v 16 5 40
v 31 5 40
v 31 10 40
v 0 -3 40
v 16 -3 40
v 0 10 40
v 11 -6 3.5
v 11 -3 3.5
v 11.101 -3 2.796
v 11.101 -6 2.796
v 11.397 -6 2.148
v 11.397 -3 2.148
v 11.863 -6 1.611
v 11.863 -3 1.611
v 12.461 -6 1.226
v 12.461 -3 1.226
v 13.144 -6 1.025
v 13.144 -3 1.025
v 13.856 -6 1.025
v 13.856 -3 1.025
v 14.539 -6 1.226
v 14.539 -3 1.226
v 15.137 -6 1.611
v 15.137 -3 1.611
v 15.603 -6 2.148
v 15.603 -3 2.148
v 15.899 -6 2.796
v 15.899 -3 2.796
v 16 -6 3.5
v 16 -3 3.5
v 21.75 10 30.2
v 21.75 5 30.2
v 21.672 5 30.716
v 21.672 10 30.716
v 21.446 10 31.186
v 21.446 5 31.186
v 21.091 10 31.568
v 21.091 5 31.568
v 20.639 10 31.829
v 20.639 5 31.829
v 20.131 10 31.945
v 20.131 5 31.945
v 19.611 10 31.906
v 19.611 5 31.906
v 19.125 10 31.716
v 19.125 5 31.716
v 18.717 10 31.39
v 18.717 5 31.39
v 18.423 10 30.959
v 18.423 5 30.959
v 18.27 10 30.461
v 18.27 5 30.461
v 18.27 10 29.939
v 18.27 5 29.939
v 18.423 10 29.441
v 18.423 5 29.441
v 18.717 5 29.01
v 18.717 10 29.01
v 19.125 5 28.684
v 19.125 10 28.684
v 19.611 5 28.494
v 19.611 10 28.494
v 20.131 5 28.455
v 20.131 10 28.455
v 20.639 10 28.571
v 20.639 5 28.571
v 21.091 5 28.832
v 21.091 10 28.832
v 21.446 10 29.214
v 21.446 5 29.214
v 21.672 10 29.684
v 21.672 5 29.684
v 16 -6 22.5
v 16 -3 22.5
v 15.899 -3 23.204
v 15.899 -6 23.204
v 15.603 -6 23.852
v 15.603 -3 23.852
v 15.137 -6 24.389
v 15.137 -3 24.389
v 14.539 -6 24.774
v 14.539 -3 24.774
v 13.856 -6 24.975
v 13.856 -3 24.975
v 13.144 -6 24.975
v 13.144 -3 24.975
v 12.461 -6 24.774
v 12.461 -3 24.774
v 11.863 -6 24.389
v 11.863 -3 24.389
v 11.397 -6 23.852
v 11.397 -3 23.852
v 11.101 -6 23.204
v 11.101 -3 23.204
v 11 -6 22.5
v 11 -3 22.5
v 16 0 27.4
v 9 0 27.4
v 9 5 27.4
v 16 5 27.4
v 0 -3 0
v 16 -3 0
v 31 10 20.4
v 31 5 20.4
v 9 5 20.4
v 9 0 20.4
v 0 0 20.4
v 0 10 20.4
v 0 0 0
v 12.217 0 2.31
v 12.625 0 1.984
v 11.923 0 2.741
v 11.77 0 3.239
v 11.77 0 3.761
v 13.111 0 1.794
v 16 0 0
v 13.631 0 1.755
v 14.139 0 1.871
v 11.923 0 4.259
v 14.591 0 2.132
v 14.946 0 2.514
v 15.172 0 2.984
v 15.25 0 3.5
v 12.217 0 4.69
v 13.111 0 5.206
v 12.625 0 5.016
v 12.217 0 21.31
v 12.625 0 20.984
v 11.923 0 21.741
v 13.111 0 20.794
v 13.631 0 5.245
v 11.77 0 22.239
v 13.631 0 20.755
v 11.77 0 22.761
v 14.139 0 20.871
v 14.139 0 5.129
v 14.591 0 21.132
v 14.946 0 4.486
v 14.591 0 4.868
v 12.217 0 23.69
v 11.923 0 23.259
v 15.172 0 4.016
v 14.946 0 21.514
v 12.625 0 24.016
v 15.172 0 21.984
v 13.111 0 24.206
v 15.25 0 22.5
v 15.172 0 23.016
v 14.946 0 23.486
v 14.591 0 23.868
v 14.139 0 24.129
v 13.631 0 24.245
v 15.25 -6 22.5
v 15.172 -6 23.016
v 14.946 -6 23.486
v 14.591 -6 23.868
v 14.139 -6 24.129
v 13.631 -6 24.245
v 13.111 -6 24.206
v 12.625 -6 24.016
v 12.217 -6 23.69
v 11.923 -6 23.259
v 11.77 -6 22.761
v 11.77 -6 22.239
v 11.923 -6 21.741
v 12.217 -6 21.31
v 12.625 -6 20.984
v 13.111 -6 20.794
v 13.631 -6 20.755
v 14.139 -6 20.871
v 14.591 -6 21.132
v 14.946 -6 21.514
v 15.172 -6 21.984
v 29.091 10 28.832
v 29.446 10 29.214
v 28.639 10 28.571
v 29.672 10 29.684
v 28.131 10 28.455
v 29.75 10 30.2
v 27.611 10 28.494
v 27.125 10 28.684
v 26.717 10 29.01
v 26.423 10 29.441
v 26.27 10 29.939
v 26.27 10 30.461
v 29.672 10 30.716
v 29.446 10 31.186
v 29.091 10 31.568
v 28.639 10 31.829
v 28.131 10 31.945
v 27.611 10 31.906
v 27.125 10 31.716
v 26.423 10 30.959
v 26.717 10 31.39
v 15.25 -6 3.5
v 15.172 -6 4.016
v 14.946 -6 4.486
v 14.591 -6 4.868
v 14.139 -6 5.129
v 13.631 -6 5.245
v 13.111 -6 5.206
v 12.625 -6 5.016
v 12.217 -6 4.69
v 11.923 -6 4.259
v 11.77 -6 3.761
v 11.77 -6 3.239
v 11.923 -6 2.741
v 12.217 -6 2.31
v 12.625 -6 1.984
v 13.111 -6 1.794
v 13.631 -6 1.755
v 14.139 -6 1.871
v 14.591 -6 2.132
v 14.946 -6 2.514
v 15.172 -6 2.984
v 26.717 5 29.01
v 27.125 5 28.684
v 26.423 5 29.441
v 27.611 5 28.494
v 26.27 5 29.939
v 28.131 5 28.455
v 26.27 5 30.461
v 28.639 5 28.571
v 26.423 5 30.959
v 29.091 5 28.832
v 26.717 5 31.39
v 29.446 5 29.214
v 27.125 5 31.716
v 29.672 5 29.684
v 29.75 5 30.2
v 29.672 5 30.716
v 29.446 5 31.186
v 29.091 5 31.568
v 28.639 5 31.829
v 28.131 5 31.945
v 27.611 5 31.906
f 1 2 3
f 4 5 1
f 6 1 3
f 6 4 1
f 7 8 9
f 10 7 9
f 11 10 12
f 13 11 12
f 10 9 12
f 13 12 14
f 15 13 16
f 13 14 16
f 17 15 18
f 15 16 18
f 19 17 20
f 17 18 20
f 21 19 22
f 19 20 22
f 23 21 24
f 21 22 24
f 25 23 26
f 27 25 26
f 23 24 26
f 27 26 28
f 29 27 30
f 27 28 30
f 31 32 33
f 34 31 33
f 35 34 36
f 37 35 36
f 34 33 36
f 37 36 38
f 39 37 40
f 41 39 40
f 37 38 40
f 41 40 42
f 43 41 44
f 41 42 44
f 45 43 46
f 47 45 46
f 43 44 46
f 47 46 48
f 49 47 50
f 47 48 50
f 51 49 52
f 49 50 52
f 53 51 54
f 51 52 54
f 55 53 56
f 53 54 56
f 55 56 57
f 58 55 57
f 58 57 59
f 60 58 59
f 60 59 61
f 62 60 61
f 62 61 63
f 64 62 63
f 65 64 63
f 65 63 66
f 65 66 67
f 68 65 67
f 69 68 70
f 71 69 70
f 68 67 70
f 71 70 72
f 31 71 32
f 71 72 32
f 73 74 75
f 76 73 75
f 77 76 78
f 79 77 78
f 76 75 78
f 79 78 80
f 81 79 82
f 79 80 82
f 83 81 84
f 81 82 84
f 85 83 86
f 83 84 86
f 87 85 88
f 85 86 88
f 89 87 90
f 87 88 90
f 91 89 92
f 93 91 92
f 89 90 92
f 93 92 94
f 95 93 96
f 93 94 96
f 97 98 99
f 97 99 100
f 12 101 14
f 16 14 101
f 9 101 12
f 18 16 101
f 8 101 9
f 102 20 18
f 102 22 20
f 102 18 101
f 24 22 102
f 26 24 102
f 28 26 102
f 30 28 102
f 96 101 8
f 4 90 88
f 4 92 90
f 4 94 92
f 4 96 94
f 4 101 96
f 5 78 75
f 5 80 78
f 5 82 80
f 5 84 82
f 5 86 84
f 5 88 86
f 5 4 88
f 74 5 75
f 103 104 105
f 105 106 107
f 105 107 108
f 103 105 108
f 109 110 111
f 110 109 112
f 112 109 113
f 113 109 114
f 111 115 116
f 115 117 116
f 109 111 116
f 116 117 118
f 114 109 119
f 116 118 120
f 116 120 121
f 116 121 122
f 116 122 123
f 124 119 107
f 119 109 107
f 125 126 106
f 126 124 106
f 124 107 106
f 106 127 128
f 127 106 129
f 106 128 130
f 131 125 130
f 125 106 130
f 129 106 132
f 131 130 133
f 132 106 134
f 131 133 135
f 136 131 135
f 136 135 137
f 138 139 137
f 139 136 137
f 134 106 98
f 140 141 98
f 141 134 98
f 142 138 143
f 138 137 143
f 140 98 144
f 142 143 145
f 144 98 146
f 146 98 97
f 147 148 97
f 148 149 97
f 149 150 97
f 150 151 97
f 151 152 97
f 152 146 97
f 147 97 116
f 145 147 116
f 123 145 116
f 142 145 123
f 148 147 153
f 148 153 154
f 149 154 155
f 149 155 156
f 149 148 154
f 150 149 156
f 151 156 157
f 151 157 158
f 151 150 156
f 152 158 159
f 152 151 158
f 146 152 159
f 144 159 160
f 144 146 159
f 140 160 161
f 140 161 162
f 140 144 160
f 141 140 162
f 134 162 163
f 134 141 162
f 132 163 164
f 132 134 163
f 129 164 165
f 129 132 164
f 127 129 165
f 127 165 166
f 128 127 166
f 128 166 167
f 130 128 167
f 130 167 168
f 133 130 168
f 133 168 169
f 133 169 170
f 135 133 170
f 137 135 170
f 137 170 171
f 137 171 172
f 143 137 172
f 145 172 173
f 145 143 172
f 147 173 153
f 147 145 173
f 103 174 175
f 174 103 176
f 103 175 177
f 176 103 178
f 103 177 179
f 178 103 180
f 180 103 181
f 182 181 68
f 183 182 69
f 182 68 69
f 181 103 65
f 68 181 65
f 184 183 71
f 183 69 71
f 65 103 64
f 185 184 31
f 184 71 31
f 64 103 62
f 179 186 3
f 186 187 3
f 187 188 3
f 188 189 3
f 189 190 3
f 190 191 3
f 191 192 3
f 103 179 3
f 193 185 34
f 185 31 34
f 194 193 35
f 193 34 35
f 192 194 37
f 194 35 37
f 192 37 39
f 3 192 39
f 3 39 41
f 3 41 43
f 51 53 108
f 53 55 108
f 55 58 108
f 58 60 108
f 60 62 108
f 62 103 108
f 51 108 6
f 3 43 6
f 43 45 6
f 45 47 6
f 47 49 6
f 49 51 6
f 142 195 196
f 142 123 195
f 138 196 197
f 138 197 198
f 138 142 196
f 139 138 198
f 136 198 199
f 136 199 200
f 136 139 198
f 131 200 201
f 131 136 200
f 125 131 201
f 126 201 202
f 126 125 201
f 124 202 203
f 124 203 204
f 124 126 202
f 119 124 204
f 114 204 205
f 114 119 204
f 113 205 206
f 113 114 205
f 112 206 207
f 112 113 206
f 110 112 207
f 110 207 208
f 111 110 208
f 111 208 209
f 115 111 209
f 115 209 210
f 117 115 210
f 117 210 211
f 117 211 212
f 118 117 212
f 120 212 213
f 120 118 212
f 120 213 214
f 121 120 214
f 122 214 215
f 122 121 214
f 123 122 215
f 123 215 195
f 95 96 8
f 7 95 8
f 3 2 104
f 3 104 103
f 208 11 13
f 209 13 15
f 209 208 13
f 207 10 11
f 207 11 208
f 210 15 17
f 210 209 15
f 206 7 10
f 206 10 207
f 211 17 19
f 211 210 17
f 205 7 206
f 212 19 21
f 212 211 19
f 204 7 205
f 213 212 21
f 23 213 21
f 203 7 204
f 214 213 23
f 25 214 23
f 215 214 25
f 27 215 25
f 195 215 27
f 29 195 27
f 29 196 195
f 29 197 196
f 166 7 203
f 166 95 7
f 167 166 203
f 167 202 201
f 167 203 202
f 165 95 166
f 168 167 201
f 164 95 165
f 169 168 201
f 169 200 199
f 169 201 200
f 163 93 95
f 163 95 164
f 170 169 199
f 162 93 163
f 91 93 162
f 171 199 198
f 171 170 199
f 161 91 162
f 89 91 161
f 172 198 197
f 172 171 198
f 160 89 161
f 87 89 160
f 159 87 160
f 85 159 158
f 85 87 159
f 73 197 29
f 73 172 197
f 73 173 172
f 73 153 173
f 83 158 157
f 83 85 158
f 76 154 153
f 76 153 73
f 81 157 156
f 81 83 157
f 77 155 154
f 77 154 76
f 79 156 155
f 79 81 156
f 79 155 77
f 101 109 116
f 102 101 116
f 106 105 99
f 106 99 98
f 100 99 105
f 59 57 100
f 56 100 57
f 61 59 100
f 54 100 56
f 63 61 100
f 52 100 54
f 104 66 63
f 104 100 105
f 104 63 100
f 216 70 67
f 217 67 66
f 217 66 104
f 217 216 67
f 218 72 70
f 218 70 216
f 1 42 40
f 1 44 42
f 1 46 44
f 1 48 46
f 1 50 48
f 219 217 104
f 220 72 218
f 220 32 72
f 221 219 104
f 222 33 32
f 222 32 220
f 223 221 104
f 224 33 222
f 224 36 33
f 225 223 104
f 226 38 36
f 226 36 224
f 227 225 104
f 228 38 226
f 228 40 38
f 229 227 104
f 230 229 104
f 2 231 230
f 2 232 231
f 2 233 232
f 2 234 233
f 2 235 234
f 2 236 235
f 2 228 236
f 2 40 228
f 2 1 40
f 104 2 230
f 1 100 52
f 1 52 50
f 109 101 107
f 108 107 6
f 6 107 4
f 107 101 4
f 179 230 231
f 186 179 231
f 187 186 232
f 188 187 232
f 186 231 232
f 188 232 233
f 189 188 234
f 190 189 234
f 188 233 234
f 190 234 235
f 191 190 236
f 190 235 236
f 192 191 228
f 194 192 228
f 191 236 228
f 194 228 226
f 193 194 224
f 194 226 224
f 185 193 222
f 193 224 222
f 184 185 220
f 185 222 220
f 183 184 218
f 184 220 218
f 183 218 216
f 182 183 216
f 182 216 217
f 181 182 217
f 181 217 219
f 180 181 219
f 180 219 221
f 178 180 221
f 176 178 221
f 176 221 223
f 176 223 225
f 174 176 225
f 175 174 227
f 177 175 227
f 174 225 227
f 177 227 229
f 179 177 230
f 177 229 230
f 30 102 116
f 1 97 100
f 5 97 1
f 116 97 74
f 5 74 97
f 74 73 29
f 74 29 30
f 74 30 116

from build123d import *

# Parameters (mm, degrees)
F0_W      = 16
F0_H      = 40
F0_R      = 1.75
F1_DEPTH  = 3
F2_R      = 1.75
F3_DEPTH  = 3
F4_W      = 16
F4_H      = 19.6
F4_R      = 1.75
F5_DEPTH  = 10
F6_W      = 5
F6_H      = 19.6
F7_DEPTH  = 15
F8_R      = 1.75
F9_DEPTH  = 5
F10_W     = 7
F10_H     = 5
F11_DEPTH = 7
F12_R     = 1.75
F13_DEPTH = 5


with BuildPart() as f1:
    # F0 (on Front) → F1 (new body)
    with BuildSketch(Plane.XZ):
        with Locations((8, 20)):
            Rectangle(F0_W, F0_H)
        with Locations((13.5, 3.5)):
            Circle(F0_R, mode=Mode.SUBTRACT)
        with Locations((13.5, 22.5)):
            Circle(F0_R, mode=Mode.SUBTRACT)
    extrude(amount=F1_DEPTH)

    # F2 (on face) → F3 (join)
    with BuildSketch(Plane.XZ.offset(3)):
        with BuildLine():
            ThreePointArc((11, 3.5), (13.5, 1), (16, 3.5))
            Line((16, 3.5), (16, 22.5))
            ThreePointArc((16, 22.5), (13.5, 25), (11, 22.5))
            Line((11, 22.5), (11, 3.5))
        make_face()
        with Locations((13.5, 3.5)):
            Circle(F2_R, mode=Mode.SUBTRACT)
        with Locations((13.5, 22.5)):
            Circle(F2_R, mode=Mode.SUBTRACT)
    extrude(amount=F3_DEPTH)

    # F4 (on face) → F5 (join)
    with BuildSketch(Plane(origin=(0, 0, 0), x_dir=(-1, 0, 0), z_dir=(0, 1, 0))):
        with Locations((-8, 30.2)):
            Rectangle(F4_W, F4_H)
        with Locations((-13.5, 22.5)):
            Circle(F4_R, mode=Mode.SUBTRACT)
    extrude(amount=F5_DEPTH)

    # F6 (on face) → F7 (join)
    with BuildSketch(Plane.YZ.offset(16)):
        with Locations((7.5, 30.2)):
            Rectangle(F6_W, F6_H)
    extrude(amount=F7_DEPTH)

    # F8 (on face) → F9 (cut, through all)
    with BuildSketch(Plane.XZ.offset(-5)):
        with Locations((20, 30.2)):
            Circle(F8_R)
        with Locations((28, 30.2)):
            Circle(F8_R)
    extrude(amount=-F9_DEPTH, mode=Mode.SUBTRACT)

    # F10 (on face) → F11 (cut)
    with BuildSketch(Plane(origin=(0, 0, 20.4), x_dir=(1, 0, 0), z_dir=(0, 0, -1))):
        with Locations((12.5, -2.5)):
            Rectangle(F10_W, F10_H)
    extrude(amount=-F11_DEPTH, mode=Mode.SUBTRACT)

    # F12 (on face) → F13 (join, through all)
    with BuildSketch(Plane.XZ.offset(-5)):
        with Locations((13.5, 22.5)):
            Circle(F12_R)
    extrude(amount=-F13_DEPTH)


solid = f1.part
